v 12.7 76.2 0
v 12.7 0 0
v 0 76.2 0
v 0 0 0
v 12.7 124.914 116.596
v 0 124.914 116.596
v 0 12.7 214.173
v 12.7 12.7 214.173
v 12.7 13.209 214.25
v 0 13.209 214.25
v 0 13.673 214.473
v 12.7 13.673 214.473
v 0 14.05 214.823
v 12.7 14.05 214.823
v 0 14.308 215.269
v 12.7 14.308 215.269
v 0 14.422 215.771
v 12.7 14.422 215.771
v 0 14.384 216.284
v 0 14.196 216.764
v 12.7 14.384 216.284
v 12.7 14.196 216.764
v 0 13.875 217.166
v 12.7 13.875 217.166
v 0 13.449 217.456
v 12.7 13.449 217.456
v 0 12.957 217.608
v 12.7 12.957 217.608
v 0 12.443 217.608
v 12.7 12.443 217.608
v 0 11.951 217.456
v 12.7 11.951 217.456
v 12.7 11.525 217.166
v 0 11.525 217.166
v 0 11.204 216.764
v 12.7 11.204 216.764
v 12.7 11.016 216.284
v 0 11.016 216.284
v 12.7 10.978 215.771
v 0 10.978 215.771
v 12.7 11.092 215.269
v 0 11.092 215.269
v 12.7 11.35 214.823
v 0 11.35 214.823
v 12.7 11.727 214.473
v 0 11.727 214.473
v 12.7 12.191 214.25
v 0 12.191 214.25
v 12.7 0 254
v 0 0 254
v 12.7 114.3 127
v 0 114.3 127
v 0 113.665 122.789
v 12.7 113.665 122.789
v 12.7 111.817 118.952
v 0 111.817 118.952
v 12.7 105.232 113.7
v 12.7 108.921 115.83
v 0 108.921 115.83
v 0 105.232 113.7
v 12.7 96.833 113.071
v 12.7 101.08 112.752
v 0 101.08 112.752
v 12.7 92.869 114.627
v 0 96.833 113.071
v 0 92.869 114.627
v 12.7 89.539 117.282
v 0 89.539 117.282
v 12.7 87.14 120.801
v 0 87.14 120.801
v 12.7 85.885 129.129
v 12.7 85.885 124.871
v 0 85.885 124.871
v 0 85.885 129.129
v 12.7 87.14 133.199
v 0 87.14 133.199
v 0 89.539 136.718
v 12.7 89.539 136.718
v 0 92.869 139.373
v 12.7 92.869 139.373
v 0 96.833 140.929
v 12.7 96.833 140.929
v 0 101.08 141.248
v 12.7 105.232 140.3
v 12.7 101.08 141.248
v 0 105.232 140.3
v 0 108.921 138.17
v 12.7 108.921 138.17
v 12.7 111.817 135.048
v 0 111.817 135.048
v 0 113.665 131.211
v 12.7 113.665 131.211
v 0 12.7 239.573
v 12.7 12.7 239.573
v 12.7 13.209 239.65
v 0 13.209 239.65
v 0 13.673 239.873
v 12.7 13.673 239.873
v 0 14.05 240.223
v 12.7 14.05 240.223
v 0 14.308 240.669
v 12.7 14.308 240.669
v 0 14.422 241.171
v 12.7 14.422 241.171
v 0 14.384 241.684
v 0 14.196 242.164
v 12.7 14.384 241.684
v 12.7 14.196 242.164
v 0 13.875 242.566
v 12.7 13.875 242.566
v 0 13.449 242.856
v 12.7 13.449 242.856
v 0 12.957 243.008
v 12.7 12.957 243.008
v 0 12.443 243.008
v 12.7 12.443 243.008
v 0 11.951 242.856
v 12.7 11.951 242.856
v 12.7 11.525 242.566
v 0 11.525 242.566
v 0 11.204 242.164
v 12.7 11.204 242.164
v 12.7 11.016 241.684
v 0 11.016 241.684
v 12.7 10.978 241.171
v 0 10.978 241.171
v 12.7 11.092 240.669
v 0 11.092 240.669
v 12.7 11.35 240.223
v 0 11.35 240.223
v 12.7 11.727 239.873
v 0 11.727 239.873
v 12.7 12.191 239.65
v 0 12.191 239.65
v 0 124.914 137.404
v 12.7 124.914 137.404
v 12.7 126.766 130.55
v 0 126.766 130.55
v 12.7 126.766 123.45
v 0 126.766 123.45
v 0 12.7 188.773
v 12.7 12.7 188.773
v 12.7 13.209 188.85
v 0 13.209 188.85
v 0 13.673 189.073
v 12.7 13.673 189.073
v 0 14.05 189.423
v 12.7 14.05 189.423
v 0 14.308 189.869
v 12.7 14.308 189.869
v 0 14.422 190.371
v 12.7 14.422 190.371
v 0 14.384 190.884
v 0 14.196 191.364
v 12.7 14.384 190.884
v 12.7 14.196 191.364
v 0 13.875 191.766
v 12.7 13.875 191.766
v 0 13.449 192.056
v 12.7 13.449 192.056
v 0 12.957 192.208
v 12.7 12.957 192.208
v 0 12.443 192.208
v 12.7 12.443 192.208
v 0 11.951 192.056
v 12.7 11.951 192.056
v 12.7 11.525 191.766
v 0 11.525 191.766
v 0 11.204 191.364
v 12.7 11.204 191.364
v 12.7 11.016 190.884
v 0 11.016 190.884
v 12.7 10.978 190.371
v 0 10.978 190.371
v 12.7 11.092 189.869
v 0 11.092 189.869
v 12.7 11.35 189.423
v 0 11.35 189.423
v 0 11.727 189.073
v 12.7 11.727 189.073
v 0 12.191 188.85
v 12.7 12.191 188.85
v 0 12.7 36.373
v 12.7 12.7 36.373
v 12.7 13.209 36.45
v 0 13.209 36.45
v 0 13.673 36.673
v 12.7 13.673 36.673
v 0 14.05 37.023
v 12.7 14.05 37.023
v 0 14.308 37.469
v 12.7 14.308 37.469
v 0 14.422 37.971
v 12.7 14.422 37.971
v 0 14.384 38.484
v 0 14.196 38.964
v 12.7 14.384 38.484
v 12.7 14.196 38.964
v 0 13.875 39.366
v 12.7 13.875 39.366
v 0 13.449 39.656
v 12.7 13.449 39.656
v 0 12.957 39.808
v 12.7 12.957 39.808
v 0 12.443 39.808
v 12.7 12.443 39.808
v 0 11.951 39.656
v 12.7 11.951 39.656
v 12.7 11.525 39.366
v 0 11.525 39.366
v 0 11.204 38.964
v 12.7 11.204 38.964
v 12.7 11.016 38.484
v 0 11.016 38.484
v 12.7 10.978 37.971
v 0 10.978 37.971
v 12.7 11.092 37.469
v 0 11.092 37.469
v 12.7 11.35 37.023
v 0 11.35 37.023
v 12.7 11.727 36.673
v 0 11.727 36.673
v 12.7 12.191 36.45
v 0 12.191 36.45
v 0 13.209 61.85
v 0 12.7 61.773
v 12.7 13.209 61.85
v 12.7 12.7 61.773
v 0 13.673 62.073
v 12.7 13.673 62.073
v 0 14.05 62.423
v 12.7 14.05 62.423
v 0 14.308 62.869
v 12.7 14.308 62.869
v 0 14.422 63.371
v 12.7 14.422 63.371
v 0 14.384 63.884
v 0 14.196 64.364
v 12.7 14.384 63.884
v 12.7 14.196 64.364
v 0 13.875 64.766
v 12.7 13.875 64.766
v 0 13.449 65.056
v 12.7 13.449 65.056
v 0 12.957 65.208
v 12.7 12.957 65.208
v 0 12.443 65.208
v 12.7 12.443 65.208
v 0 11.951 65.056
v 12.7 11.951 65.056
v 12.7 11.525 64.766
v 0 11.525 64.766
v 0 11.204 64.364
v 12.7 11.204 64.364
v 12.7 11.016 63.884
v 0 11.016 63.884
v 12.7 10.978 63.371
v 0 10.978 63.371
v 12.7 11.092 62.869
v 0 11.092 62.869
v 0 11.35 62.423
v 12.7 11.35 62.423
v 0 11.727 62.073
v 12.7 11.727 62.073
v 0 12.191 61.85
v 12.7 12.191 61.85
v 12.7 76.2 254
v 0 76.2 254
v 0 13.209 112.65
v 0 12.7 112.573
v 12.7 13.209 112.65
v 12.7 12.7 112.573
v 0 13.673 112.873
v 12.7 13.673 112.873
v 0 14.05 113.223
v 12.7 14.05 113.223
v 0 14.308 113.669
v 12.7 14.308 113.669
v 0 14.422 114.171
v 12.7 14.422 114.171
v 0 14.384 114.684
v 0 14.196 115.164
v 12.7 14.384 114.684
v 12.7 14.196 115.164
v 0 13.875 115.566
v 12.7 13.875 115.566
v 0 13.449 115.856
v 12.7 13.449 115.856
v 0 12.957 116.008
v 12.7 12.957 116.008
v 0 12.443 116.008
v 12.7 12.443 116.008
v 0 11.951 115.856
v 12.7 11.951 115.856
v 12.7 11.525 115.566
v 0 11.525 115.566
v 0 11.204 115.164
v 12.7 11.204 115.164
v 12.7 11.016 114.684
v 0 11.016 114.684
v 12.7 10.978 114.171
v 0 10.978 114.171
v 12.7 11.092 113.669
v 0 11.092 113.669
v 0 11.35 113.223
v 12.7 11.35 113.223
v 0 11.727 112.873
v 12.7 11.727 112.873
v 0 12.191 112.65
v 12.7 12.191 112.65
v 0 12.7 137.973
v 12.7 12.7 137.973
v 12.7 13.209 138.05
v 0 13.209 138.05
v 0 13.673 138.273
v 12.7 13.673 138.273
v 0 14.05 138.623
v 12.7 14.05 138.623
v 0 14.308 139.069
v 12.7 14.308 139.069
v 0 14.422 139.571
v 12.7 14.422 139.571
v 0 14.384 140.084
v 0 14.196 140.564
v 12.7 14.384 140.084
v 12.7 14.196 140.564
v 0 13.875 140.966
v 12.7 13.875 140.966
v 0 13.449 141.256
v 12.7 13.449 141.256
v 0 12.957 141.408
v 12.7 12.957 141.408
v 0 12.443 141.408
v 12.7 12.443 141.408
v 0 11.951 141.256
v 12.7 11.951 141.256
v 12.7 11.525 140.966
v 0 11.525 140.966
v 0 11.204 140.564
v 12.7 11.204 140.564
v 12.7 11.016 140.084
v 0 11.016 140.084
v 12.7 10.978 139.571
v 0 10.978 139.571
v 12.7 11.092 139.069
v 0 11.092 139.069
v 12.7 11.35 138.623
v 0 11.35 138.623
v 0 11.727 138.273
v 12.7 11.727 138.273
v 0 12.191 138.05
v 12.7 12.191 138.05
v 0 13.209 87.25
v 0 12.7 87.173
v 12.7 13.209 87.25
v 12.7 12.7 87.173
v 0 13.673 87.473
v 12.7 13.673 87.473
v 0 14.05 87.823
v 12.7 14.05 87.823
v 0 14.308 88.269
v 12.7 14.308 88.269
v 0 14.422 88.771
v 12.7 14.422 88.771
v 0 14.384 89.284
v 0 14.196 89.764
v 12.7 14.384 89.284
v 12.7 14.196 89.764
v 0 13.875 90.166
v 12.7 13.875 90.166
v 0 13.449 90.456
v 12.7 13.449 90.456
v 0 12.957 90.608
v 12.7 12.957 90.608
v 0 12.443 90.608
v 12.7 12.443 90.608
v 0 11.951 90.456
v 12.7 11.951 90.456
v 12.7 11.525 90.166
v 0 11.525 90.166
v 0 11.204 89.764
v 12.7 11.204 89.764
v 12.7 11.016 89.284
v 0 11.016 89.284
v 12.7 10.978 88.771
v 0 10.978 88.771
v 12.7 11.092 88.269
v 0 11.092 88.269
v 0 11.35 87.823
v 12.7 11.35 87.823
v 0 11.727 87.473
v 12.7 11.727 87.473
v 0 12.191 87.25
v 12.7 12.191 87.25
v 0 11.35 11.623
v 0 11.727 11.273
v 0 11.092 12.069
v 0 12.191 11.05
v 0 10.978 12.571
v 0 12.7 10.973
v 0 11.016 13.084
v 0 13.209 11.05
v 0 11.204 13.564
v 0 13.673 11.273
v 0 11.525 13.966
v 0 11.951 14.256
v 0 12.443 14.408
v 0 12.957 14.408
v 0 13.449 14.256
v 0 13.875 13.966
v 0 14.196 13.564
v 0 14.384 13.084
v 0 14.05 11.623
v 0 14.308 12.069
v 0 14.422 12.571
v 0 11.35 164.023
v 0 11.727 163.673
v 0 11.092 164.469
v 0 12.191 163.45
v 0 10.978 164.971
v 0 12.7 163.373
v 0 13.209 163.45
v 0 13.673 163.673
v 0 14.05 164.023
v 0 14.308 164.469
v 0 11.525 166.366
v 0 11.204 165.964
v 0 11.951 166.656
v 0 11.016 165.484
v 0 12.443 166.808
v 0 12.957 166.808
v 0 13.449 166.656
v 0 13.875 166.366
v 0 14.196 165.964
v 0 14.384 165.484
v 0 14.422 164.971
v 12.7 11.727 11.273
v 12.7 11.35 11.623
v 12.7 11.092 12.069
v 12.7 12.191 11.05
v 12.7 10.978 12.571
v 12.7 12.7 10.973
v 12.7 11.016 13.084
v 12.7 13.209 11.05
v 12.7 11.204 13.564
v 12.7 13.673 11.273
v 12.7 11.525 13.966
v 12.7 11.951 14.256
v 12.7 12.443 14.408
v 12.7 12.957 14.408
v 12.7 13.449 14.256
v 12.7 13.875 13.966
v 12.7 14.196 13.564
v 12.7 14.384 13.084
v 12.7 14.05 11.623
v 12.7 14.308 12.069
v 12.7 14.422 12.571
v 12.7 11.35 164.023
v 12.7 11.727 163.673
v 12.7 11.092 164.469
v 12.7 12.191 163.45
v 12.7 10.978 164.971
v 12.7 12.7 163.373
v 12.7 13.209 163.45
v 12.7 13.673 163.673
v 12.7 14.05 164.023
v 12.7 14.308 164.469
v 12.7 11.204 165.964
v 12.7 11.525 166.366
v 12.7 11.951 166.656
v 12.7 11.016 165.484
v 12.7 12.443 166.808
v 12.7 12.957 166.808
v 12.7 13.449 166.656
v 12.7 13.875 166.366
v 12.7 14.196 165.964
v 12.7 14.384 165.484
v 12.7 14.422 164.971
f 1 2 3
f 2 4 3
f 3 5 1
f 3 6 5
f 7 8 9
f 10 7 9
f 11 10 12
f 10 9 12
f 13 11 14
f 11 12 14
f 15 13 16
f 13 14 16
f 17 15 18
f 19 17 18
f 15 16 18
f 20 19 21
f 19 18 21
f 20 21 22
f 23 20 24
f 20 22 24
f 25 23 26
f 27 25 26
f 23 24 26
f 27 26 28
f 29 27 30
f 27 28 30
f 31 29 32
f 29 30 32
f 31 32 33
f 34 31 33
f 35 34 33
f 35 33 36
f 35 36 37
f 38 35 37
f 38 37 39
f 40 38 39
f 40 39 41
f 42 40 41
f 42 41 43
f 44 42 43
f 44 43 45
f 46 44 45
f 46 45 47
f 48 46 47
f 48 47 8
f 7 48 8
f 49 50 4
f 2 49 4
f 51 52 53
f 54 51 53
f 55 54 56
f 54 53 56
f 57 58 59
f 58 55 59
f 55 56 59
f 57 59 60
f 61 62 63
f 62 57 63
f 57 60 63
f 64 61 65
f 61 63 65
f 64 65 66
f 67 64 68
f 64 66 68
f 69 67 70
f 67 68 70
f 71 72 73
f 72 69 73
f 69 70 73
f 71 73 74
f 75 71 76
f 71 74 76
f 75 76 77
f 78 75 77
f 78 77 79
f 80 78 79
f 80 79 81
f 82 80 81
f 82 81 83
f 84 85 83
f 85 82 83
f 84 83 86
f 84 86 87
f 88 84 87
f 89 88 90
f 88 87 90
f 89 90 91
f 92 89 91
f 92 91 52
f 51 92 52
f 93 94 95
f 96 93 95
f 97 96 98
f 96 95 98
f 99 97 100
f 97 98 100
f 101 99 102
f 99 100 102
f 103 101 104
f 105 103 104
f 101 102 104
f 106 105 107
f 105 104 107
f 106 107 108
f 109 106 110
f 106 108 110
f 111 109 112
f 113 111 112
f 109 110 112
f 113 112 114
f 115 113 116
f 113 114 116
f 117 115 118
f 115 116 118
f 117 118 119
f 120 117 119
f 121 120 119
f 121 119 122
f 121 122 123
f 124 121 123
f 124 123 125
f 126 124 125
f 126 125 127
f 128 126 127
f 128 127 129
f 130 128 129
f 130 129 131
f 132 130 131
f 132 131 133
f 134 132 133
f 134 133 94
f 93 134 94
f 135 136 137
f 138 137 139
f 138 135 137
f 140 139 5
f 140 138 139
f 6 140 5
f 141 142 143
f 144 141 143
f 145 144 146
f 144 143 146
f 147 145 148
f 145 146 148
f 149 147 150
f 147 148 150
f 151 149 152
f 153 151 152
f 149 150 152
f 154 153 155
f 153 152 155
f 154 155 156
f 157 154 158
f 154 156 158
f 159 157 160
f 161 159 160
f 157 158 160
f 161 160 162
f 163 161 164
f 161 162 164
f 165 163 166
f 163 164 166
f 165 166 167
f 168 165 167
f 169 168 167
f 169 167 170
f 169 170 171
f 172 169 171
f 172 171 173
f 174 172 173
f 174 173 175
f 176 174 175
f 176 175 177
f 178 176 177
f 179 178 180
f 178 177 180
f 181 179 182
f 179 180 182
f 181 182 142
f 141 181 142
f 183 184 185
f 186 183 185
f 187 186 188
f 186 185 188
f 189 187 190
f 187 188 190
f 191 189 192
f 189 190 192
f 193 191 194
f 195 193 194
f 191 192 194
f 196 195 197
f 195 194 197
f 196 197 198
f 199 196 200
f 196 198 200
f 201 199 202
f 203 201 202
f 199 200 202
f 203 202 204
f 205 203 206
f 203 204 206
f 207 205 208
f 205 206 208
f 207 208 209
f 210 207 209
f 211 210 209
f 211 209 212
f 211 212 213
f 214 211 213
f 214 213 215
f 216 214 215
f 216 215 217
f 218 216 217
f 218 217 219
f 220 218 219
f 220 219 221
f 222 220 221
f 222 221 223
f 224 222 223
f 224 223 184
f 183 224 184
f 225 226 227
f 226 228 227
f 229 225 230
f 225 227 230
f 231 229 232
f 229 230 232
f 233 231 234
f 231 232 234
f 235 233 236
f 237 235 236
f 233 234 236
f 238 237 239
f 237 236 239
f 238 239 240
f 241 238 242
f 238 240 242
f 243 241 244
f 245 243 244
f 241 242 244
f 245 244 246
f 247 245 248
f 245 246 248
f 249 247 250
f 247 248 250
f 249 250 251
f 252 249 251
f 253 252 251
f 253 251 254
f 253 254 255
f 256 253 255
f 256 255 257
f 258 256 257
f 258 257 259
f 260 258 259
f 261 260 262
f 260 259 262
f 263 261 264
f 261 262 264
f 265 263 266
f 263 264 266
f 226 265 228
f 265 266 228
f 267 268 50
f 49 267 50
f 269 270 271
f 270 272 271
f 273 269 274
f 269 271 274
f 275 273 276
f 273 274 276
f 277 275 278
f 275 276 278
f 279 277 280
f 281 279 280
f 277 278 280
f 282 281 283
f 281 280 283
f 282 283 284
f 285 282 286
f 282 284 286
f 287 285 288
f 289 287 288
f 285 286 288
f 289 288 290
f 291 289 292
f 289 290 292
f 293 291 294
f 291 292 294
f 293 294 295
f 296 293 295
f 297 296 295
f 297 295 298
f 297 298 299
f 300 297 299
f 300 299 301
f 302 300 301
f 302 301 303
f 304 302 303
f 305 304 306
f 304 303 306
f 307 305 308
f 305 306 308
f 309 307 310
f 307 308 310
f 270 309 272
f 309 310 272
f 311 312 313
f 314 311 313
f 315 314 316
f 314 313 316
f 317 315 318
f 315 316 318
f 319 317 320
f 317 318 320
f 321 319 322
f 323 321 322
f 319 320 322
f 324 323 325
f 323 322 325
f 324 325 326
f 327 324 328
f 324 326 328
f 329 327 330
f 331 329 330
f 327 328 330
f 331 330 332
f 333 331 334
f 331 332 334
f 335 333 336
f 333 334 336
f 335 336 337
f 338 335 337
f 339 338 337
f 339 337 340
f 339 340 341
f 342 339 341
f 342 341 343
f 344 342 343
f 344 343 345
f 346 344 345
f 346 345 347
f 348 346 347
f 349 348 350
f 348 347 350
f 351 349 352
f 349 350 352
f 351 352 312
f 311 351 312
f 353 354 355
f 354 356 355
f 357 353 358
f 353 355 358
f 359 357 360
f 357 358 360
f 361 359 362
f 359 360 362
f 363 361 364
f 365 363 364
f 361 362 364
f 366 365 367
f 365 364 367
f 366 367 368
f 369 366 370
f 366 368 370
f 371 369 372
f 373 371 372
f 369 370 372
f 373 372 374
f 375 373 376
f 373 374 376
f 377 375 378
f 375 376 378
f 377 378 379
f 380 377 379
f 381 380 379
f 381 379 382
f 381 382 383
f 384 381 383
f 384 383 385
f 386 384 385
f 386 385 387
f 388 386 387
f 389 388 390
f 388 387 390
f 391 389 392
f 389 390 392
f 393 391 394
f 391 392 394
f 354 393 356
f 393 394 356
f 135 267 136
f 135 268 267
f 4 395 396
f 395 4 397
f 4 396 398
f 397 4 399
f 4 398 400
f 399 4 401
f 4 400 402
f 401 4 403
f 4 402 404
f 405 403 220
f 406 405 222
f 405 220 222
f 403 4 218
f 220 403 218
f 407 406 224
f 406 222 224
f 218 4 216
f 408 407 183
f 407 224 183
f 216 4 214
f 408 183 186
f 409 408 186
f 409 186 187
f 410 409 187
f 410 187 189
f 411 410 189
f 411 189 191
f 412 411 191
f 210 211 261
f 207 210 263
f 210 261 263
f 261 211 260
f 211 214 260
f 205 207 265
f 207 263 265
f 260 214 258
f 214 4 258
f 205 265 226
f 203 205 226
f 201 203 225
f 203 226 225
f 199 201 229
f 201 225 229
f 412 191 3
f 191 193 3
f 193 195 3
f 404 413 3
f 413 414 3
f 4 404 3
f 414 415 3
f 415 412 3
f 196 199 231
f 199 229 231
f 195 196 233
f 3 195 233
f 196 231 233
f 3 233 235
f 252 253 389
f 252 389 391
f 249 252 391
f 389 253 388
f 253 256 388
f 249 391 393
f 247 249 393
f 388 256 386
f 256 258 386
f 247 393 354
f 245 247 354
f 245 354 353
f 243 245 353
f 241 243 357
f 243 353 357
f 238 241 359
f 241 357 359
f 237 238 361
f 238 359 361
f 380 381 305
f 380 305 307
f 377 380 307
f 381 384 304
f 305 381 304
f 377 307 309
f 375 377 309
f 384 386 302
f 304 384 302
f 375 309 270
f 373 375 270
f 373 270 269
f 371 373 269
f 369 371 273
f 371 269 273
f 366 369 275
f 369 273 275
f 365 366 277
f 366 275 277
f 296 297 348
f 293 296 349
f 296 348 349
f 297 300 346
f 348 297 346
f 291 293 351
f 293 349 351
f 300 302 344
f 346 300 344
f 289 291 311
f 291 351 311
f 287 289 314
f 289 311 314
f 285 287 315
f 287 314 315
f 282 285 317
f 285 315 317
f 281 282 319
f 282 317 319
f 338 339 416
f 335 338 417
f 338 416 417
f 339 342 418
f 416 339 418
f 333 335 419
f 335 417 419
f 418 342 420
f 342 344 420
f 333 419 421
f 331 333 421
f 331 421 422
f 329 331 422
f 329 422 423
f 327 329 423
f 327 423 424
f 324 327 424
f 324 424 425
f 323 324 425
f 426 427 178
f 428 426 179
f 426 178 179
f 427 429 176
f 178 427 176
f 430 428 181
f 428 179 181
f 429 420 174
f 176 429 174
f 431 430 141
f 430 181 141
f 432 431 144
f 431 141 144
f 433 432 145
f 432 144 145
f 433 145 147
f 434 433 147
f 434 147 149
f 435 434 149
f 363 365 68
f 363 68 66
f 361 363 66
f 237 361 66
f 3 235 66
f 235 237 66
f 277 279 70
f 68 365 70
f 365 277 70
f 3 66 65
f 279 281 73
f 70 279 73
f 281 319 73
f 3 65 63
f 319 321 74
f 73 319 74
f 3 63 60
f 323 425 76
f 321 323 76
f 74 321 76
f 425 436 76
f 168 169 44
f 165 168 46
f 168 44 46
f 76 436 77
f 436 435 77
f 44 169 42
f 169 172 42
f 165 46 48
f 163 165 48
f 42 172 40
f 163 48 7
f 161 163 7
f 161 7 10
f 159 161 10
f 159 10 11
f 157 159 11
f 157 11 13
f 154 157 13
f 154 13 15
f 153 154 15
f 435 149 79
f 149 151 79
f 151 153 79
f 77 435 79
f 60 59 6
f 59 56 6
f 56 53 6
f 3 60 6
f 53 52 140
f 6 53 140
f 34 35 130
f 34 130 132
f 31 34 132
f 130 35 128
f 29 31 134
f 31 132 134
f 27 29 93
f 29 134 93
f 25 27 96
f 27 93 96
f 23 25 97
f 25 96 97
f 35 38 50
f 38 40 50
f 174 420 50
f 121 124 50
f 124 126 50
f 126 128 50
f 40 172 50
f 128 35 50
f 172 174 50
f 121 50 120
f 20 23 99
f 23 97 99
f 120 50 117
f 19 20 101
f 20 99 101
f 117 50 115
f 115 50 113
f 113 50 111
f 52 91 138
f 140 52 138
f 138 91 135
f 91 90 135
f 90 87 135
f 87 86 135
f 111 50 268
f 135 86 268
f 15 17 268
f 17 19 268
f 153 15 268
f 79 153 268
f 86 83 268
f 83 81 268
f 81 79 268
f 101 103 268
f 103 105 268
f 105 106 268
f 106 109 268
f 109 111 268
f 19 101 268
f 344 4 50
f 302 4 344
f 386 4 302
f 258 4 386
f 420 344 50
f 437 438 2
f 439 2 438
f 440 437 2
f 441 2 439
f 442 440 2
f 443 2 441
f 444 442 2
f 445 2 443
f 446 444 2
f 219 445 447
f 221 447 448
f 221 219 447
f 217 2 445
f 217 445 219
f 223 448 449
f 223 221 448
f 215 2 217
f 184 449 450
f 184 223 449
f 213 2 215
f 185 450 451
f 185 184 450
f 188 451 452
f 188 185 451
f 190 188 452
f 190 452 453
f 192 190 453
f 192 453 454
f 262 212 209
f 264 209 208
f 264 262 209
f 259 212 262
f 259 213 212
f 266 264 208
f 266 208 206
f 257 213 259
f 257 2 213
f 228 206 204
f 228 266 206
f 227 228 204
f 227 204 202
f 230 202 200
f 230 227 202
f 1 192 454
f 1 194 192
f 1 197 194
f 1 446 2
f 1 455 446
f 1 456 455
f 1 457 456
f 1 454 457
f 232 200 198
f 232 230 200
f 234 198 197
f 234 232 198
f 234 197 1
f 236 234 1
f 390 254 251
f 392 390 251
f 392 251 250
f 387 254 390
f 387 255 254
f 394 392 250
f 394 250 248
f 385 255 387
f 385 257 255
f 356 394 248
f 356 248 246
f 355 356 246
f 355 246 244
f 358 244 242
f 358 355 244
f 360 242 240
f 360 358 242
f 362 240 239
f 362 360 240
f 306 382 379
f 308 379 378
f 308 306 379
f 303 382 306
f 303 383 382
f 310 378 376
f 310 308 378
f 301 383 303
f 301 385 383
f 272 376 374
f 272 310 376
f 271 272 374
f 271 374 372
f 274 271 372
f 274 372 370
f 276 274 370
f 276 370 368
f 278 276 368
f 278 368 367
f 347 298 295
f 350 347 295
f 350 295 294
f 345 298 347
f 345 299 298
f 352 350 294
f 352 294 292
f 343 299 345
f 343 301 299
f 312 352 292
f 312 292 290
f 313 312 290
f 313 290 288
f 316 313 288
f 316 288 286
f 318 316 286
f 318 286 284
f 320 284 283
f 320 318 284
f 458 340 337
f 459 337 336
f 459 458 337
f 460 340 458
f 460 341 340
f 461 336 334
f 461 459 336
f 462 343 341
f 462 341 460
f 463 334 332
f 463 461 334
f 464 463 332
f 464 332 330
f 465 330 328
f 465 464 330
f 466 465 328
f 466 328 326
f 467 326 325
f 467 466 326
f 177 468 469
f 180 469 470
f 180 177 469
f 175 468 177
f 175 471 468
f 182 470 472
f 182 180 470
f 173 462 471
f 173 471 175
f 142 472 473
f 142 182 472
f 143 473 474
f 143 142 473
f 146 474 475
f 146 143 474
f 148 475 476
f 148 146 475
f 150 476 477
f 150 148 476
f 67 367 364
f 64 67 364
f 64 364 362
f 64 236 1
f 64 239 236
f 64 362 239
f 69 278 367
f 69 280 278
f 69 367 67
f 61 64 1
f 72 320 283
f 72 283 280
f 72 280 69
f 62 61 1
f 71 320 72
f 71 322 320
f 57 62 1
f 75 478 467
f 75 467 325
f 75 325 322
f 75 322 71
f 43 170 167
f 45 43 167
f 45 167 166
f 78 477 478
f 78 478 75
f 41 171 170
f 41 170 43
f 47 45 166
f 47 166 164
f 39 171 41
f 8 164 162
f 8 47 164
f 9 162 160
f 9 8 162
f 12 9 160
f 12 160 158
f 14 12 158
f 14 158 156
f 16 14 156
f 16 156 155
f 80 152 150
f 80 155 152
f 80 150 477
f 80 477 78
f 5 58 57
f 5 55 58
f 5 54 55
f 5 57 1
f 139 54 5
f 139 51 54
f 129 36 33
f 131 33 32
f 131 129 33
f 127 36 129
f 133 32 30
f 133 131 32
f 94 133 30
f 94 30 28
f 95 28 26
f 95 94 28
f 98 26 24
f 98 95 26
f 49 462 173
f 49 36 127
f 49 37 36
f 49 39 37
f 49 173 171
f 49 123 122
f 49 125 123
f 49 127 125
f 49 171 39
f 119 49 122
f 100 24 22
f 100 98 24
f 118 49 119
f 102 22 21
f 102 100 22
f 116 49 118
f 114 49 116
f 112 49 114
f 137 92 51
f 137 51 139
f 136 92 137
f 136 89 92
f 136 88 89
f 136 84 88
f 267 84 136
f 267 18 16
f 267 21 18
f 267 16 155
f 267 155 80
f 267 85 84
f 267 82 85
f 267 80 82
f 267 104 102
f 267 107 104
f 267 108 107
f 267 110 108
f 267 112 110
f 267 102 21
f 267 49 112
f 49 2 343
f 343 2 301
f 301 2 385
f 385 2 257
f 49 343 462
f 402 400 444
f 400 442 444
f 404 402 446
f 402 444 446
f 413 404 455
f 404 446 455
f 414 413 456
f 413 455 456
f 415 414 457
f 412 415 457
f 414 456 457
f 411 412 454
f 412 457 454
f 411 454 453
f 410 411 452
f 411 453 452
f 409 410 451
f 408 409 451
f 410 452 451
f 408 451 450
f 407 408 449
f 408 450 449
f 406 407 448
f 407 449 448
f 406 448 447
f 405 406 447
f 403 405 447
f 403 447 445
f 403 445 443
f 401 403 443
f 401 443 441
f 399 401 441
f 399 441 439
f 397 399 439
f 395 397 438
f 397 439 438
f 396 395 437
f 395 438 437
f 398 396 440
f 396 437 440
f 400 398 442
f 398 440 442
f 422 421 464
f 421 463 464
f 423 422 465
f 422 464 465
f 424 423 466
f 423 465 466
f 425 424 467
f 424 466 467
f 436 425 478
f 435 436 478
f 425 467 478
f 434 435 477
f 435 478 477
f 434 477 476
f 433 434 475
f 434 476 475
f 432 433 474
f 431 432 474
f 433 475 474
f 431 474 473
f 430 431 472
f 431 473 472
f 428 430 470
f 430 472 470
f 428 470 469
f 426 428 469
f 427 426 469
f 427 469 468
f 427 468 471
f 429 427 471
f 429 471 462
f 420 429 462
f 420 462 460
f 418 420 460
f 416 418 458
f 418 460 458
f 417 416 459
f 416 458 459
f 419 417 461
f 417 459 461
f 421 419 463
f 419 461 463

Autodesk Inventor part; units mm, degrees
ref_plane "YZ Plane" through (0, 0, 0) normal (1, 0, 0) x (0, 1, 0)
ref_plane "XZ Plane" through (0, 0, 0) normal (0, 1, 0) x (-1, 0, 0)
ref_plane "XY Plane" through (0, 0, 0) normal (0, 0, 1) x (1, 0, 0)
sketch "Sketch1" plane through (0, 0, 0) normal (1, 0, 0) x (0, 1, 0)
  line L0 (127, 254) -> (0, 254)
  line L1 (0, 254) -> (0, 0)
  line L2 (0, 0) -> (127, 0)
  line L3 (127, 0) -> (127, 254)
  circle A0 centre (100.0125, 127) radius 14.2875
  circle A1 centre (100.0125, 127) radius 26.9875
  line L4 (76.2, 254) -> (124.914, 137.4039)
  line L5 (124.914, 116.5961) -> (76.2, 0)
  dimension "d0" = 254
  dimension "d1" = 127
  dimension "d2" = 28.575
  dimension "d3" = 12.7
  dimension "d4" = 127
  dimension "d5" = 76.2
  dimension "d6" = 76.2
extrude "Extrusion1" add sketch "Sketch1" along normal blind 12.7 contours L4 A1 L5 L2 L1 L0 | A1
sketch "Sketch2" plane through (12.7, 0, 0) normal (1, 0, 0) x (0, 0, -1)
  circle A0 centre (-241.3, 12.7) radius 1.7272
  line L0 (-254, 76.2) -> (-254, 0) projected
  line L1 (-254, 0) -> (0, 0) projected
  dimension "d9" = 12.7
  dimension "d10" = 12.7
  dimension "d11" = 3.4544
extrude "Extrusion2" cut sketch "Sketch2" against normal through all
pattern_linear "Rectangular Pattern1" count 10 spacing 25.4 along (0, 0, -1) of "Extrusion2"
properties part number "Jeep Plate 2.0" material "Polycarbonate, Smoke"
